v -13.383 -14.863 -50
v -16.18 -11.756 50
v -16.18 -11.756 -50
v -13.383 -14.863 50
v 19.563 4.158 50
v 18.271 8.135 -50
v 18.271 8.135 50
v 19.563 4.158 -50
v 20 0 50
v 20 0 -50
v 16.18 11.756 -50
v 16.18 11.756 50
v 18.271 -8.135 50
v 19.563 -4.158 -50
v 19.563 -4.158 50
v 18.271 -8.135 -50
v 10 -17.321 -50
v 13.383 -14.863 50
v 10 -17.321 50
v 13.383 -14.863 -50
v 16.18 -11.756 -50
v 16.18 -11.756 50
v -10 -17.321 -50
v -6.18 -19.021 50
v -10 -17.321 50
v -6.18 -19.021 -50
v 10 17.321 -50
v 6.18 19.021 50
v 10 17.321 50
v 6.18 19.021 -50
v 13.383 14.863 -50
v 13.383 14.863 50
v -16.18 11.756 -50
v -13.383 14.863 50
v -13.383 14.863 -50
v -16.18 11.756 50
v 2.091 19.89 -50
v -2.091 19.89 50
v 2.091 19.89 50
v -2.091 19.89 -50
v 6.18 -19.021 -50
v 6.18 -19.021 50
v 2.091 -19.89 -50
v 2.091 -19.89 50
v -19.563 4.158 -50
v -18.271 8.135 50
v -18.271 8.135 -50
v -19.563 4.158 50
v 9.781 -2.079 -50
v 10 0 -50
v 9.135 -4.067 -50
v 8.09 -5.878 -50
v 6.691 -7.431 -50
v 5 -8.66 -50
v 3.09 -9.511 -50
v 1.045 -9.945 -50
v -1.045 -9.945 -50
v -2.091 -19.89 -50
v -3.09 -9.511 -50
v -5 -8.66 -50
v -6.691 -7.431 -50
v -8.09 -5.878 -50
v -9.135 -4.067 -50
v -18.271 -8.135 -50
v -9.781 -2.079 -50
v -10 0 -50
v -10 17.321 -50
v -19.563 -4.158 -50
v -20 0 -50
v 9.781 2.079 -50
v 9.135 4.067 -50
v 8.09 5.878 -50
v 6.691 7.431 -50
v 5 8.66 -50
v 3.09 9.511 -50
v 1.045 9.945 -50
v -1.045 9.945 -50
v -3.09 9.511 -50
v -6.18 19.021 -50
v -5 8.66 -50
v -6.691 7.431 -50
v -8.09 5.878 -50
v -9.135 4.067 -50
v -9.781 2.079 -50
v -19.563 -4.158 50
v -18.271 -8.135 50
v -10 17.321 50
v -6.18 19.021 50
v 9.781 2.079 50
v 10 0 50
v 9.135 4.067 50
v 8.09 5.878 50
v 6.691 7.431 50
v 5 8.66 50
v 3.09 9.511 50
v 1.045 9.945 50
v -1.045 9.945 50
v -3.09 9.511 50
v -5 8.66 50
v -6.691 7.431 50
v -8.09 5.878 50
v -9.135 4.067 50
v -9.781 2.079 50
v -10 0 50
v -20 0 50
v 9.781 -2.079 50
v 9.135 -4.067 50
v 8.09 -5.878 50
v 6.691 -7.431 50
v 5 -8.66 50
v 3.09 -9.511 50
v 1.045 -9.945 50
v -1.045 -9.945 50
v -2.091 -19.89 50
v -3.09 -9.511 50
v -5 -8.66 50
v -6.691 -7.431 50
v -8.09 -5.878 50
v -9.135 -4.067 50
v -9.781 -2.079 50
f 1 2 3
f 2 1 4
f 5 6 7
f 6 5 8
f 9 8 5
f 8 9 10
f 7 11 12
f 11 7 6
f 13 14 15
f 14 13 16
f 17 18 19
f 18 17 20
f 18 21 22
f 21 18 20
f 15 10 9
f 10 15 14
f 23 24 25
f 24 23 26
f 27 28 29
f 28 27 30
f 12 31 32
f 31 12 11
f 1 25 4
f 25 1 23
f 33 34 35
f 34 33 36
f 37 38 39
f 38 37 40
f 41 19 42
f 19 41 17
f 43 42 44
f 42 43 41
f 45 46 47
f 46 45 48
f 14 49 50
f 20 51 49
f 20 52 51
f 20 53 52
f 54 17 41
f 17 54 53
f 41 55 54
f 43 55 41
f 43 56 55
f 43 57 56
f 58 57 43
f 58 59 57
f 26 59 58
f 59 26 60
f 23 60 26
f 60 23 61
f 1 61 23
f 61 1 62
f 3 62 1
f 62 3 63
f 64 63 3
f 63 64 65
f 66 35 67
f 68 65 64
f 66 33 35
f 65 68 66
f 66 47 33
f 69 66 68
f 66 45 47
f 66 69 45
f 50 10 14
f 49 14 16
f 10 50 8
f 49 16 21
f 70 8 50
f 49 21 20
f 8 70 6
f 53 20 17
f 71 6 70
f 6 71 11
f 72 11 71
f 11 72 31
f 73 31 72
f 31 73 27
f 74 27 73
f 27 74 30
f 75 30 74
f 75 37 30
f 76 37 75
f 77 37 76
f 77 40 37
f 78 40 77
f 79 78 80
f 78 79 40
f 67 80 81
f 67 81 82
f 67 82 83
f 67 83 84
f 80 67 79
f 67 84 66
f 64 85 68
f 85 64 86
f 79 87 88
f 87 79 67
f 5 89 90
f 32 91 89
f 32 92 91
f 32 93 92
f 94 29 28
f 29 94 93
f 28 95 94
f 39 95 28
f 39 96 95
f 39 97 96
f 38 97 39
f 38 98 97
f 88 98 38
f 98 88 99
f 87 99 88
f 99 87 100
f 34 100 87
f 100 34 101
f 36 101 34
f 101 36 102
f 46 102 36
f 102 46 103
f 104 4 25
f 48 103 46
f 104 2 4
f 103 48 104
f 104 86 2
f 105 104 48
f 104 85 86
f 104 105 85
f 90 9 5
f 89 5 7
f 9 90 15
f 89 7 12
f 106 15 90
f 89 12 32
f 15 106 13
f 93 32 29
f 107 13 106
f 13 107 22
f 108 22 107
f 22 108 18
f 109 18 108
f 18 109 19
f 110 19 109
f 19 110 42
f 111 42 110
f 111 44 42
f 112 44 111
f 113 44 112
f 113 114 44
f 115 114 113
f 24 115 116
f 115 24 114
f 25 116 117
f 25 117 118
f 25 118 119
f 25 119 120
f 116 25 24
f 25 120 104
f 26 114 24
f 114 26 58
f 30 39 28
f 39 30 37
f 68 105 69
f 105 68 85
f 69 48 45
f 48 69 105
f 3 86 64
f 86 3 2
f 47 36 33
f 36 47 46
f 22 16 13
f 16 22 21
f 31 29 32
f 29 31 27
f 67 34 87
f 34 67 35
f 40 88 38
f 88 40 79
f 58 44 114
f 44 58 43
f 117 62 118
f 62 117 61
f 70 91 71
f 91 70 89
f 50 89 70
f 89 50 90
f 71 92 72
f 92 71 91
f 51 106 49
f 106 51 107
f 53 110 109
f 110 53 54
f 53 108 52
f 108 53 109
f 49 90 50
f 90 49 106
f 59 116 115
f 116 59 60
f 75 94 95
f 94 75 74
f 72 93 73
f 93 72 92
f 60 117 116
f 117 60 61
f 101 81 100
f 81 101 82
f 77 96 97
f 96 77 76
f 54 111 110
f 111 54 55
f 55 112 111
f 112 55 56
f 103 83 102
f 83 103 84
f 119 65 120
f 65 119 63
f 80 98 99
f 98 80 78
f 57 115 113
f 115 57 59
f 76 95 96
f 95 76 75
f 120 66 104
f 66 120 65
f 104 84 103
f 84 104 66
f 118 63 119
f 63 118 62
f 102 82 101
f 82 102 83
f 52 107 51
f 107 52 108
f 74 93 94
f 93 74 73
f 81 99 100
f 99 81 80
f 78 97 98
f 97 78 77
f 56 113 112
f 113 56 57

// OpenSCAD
// file: lib.scad
// See http://en.wikibooks.org/wiki/OpenSCAD_User_Manual/Include_Statement

module pipe(r1, r2, h) {
    difference() {
        cylinder(r=r1, h=h, center=true);
        cylinder(r=r2, h=h+1, center=true);
    }
}
// main file
// See http://en.wikibooks.org/wiki/OpenSCAD_User_Manual/Include_Statement

// preview: F5
// compile and render: F6

use <lib.scad>

pipe(20, 10, 100);
